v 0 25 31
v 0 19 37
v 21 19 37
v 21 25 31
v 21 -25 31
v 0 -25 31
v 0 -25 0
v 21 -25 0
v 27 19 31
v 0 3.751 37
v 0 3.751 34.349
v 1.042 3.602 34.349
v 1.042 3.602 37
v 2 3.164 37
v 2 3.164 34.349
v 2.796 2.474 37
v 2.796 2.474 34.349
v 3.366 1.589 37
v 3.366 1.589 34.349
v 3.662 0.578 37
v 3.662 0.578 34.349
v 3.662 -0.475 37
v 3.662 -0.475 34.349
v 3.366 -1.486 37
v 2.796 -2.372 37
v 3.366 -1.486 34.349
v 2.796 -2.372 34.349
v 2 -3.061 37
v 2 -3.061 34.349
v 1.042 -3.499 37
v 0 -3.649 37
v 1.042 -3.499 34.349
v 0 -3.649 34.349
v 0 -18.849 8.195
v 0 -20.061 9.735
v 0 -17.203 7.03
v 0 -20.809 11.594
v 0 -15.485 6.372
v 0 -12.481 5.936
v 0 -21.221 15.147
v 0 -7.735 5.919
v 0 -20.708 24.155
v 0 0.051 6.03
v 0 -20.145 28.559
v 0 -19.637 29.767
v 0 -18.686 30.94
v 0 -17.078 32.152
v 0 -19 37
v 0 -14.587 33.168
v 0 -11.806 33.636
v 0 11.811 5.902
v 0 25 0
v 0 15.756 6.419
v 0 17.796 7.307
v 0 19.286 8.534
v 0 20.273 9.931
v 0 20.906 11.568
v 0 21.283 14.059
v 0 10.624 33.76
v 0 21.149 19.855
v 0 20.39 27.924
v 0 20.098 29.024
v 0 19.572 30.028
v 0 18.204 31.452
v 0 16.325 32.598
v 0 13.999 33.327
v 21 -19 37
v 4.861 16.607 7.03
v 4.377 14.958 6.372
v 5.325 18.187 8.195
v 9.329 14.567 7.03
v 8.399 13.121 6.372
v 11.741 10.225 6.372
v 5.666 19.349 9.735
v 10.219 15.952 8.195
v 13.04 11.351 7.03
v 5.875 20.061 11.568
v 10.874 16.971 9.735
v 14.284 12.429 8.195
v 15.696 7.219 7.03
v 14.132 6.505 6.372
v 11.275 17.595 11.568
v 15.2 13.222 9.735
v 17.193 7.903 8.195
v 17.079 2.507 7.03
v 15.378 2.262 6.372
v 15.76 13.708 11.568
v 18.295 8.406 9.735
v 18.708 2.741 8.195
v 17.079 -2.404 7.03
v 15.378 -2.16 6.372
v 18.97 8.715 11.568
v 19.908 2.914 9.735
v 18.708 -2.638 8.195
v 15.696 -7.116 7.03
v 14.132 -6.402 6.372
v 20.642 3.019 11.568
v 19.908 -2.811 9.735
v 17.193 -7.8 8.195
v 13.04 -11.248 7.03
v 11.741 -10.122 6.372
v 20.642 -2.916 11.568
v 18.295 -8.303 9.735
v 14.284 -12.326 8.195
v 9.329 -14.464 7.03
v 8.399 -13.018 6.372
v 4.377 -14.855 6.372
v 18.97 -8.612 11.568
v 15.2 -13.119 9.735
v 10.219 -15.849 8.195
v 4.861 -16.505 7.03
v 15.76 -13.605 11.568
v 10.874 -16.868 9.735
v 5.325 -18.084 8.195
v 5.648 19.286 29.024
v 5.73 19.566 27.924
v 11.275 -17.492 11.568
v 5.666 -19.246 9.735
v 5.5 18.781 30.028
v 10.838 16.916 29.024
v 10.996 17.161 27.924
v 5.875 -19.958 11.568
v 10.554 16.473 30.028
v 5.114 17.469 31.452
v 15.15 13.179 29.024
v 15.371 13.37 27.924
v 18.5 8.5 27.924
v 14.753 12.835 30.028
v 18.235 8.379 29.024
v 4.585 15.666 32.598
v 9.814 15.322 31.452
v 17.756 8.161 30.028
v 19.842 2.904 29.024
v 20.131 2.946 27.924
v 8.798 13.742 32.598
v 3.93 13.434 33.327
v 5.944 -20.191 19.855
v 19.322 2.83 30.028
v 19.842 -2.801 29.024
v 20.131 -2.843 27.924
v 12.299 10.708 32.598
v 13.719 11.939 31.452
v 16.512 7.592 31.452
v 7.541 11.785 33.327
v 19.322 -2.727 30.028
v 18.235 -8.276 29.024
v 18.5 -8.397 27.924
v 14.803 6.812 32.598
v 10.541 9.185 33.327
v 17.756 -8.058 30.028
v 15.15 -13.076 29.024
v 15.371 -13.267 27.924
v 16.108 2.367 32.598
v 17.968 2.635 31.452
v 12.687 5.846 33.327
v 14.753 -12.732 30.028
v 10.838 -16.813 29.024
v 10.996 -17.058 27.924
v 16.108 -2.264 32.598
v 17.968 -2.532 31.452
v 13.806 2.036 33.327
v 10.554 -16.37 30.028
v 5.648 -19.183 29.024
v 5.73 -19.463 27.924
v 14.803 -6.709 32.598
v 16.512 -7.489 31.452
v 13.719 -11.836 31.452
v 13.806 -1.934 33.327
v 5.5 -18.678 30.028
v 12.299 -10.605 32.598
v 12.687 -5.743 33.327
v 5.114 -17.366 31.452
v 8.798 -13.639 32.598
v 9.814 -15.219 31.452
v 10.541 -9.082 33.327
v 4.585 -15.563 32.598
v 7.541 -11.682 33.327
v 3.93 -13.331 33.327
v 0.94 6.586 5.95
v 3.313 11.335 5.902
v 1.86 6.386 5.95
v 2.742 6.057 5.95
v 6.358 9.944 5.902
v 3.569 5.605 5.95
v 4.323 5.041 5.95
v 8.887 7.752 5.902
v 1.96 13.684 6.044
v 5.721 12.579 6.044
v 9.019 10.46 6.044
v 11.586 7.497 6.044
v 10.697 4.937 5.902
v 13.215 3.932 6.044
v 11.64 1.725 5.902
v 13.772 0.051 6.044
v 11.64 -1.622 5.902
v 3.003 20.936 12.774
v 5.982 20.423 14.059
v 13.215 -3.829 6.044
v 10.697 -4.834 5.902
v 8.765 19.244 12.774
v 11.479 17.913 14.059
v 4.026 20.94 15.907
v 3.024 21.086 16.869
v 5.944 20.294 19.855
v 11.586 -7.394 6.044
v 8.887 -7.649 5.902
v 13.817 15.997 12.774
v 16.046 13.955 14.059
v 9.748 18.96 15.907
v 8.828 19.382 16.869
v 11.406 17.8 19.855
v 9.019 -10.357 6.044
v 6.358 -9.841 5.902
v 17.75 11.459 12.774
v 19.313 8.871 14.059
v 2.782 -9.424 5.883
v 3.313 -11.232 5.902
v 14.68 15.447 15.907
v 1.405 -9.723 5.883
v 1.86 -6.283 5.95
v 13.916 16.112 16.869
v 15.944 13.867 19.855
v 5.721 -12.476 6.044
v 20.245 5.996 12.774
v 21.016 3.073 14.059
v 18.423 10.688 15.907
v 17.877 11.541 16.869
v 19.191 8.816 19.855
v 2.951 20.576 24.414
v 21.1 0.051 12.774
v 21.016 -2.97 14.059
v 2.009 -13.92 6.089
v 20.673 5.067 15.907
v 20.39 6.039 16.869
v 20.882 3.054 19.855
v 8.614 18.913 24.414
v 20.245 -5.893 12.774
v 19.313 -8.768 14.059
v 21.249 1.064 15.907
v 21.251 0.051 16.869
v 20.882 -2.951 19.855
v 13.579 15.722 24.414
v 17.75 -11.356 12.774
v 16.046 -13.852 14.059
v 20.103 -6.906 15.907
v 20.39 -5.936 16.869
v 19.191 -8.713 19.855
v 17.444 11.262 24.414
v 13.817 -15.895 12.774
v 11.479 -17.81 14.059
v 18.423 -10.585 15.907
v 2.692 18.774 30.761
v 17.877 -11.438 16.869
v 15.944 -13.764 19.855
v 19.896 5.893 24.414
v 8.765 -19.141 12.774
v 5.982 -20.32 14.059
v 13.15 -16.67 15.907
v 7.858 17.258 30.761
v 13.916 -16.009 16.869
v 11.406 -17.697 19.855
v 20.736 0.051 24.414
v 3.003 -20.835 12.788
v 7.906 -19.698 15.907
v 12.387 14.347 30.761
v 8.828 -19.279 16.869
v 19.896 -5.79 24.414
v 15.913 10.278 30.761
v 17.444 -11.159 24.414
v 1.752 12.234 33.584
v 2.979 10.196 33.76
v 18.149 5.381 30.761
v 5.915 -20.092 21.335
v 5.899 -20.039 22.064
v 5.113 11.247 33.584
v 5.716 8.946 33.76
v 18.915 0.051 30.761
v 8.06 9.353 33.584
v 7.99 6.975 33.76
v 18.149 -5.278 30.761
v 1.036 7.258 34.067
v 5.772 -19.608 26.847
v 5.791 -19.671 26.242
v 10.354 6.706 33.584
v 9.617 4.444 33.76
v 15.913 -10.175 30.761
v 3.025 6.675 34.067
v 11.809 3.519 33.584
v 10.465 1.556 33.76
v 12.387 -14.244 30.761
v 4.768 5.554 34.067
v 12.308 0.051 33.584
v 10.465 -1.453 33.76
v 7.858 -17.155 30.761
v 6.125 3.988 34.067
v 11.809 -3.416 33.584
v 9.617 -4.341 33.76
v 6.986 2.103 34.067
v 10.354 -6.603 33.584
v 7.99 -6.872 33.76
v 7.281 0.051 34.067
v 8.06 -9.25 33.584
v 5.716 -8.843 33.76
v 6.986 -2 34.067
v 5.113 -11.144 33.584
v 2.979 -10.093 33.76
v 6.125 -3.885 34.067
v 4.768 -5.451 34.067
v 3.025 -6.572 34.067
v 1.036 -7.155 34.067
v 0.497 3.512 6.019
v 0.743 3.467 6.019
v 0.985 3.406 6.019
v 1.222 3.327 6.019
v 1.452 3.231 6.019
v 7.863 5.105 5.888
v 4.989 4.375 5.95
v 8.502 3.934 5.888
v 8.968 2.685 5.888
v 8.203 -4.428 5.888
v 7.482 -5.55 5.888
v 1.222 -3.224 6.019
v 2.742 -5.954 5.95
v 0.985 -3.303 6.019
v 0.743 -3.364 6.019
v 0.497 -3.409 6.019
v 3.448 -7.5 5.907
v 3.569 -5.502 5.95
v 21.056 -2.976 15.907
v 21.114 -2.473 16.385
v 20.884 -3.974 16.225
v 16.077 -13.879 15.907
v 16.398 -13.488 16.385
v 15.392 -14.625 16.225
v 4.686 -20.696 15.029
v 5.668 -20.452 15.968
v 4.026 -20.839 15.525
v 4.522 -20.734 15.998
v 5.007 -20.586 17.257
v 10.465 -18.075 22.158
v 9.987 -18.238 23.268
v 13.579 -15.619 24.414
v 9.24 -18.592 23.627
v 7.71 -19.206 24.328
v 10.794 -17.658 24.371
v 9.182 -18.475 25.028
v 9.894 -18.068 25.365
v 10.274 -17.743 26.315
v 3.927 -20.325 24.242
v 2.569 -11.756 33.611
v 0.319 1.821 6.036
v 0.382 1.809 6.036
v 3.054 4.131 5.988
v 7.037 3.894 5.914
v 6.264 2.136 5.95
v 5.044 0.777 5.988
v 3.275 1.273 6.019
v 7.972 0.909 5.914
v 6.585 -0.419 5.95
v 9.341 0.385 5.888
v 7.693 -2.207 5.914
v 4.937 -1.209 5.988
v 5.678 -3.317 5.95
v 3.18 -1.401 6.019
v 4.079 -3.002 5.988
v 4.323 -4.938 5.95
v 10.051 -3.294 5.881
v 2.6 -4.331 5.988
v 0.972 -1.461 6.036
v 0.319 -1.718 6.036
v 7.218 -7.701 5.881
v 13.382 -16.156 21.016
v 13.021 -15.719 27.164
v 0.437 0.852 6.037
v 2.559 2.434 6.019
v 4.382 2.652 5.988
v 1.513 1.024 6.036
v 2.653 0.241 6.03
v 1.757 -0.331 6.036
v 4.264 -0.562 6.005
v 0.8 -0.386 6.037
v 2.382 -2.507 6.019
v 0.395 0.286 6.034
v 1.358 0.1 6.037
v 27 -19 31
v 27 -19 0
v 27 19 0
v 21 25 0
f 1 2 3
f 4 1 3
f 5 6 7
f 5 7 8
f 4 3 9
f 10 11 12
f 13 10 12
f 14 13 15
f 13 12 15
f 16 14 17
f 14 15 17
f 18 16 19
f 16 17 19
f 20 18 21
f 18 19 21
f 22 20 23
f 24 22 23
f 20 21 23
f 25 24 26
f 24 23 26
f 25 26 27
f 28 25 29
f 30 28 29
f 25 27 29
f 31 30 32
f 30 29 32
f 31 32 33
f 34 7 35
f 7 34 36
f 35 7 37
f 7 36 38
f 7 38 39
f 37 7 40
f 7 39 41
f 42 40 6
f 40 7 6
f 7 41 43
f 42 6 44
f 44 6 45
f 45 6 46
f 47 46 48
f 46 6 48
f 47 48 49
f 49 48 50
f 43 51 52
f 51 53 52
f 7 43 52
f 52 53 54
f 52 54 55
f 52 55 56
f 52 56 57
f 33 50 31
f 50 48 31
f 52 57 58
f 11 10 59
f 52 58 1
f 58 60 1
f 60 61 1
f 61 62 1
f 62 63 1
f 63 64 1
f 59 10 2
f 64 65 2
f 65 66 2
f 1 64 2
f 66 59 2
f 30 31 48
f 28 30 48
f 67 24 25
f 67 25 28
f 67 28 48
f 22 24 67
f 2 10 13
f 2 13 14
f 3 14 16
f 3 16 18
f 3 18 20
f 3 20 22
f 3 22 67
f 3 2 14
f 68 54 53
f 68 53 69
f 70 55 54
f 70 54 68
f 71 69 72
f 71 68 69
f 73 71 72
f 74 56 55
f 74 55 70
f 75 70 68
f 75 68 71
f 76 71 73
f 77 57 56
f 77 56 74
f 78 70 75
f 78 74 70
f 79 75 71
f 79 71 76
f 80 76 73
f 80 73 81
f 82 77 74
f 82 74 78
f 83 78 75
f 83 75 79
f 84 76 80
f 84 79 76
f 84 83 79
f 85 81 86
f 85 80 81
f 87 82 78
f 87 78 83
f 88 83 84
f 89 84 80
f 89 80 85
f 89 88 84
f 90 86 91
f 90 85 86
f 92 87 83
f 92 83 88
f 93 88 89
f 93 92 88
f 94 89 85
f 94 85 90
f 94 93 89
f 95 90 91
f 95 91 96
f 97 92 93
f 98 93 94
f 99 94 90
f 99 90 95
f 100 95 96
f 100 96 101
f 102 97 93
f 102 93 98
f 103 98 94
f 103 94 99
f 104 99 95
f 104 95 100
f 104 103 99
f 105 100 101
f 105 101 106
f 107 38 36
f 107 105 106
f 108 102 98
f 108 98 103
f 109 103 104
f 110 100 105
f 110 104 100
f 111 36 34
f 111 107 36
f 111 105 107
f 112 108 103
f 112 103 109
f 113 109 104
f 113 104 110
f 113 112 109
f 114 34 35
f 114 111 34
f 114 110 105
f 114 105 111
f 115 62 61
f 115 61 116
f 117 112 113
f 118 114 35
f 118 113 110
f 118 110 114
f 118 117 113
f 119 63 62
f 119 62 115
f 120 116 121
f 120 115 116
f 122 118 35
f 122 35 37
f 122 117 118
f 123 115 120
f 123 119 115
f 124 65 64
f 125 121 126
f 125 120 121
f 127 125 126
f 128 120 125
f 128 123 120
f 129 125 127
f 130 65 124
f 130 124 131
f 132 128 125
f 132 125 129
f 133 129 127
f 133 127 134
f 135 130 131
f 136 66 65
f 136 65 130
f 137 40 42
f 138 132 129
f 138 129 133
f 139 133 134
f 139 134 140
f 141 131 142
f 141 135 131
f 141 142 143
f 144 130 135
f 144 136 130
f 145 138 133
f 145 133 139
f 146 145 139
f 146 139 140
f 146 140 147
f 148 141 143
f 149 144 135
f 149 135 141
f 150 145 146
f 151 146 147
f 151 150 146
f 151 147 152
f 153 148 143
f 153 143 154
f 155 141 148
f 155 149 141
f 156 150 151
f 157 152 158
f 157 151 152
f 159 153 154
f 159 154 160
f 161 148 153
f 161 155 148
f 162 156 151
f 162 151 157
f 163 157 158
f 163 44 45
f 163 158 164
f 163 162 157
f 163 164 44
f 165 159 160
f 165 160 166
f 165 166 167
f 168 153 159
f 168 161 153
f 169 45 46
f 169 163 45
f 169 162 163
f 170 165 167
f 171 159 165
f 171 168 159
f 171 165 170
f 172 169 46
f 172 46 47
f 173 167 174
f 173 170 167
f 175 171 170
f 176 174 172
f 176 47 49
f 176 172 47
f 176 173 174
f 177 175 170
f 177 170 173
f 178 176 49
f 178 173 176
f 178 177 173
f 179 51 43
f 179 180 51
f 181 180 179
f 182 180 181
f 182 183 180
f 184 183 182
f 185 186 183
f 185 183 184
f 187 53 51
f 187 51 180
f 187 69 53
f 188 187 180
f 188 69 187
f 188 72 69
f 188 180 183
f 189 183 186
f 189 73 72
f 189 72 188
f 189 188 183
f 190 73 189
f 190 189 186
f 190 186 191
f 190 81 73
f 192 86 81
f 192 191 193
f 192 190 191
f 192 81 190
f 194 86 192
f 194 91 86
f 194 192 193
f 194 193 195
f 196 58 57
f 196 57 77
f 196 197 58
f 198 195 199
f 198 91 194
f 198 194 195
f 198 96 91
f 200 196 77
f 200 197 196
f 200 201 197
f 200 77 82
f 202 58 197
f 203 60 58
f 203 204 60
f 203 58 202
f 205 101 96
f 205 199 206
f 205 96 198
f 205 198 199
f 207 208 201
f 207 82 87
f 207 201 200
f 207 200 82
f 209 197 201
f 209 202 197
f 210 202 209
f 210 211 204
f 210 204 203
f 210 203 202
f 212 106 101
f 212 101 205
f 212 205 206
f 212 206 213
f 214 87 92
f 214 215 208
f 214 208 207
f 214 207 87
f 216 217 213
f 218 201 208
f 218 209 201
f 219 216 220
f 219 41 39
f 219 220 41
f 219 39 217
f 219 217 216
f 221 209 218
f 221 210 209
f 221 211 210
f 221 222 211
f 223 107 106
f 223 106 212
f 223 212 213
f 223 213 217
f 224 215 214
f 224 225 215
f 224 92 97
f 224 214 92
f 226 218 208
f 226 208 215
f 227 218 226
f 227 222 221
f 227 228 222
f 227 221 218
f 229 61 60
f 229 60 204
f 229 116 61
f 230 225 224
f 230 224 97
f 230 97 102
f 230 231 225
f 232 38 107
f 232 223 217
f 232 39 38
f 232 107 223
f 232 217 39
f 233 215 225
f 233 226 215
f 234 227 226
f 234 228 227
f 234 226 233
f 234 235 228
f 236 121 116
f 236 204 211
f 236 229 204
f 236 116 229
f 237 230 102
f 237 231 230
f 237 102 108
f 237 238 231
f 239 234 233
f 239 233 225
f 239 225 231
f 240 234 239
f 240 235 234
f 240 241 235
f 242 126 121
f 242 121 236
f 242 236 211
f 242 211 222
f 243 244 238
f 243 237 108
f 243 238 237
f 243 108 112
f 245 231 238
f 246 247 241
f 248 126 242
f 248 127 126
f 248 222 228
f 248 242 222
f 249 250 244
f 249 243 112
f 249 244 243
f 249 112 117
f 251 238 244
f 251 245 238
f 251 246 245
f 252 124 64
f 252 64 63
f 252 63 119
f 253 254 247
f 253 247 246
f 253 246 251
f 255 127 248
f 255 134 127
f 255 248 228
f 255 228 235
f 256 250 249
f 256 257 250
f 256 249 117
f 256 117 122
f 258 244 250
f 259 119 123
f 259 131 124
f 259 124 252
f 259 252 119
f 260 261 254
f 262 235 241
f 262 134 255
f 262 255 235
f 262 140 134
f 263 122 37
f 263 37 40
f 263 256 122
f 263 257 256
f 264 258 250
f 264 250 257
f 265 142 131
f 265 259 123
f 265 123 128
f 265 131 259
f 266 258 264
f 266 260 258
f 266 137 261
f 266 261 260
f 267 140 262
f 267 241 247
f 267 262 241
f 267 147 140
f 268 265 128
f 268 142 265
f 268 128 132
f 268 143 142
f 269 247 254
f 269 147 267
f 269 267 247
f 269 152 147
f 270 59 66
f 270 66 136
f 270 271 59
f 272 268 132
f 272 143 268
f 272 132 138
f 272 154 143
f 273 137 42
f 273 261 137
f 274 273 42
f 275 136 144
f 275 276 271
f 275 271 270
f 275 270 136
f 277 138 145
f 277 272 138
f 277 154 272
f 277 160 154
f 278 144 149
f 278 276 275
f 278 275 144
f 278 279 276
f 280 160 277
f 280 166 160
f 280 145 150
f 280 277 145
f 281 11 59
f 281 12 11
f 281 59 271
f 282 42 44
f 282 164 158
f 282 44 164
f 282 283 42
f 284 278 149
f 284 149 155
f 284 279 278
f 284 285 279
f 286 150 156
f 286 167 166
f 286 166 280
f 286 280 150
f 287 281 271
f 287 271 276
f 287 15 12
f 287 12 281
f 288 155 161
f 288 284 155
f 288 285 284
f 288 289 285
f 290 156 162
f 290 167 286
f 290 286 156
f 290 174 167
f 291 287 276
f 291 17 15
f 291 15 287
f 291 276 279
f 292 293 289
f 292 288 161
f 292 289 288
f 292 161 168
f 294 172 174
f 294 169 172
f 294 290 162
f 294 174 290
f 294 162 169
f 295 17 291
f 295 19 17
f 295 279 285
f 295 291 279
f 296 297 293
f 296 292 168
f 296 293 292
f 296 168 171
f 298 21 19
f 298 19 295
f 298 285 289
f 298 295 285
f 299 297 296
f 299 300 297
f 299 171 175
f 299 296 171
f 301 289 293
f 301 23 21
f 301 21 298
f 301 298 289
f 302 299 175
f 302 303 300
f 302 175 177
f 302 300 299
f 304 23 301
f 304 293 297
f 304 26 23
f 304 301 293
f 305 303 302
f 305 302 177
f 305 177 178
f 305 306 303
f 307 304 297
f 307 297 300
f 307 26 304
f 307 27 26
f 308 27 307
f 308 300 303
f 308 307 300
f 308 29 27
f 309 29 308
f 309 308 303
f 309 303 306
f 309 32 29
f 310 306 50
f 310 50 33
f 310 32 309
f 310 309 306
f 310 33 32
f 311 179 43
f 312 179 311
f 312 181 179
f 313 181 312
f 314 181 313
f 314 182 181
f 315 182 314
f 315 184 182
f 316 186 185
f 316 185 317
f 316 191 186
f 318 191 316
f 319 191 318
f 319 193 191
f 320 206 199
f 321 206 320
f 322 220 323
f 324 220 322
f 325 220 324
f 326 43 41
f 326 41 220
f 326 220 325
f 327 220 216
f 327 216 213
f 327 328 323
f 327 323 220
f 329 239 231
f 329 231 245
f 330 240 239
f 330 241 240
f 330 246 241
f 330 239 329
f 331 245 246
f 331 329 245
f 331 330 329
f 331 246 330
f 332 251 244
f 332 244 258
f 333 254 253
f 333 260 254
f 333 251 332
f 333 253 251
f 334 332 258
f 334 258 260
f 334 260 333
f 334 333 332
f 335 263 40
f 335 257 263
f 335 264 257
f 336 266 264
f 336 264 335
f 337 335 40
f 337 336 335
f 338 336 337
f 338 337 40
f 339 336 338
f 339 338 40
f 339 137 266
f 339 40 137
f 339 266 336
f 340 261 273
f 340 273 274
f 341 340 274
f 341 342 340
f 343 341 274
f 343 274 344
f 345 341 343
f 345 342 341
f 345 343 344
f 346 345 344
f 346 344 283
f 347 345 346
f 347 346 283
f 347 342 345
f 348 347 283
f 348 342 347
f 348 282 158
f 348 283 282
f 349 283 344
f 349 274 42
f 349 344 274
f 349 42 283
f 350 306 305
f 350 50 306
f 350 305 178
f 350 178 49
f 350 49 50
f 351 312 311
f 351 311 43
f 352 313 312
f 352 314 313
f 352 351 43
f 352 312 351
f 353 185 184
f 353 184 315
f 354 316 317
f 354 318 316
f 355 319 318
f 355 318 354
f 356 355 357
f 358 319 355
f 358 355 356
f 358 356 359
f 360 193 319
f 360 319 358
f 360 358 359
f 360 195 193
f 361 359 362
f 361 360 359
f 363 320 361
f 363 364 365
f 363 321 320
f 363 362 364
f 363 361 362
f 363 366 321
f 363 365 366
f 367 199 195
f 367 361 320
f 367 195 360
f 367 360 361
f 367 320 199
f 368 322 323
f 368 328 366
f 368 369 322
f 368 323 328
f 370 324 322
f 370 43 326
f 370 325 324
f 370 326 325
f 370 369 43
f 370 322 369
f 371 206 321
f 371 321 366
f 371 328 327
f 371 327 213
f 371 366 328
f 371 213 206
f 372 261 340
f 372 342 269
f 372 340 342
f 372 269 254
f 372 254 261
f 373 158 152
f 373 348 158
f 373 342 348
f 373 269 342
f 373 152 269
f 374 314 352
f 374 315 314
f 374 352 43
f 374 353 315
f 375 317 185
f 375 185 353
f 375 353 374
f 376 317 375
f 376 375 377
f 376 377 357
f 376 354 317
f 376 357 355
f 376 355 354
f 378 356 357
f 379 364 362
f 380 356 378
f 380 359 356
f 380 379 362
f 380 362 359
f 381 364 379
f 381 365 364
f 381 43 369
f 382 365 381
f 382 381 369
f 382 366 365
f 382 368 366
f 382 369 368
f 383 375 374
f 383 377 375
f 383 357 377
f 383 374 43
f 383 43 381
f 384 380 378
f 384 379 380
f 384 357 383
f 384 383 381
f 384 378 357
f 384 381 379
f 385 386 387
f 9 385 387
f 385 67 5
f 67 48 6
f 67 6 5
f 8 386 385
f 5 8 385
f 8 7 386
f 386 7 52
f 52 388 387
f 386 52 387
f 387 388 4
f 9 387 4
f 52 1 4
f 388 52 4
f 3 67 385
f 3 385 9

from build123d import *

# Parameters (mm, degrees)
F0_W     = 54
F0_H     = 50
F1_DEPTH = 37
F2_SIZE  = 6
F3_W     = 33.1910252571
F3_H     = 75.3957368433
F4_DEPTH = 50


with BuildPart() as f1:
    # F0 (on Top) → F1 (new body)
    with BuildSketch(Plane.XY):
        Rectangle(F0_W, F0_H)
    extrude(amount=F1_DEPTH)

    # F2
    f2_edges = [f1.edges().sort_by_distance(p)[0] for p in [
        (0, -25, 37),
        (27, 0, 37),
        (0, 25, 37),
        (-27, 0, 37),
        (27, -25, 18.5),
        (27, 25, 18.5),
        (-27, -25, 18.5),
        (-27, 25, 18.5),
    ]]
    chamfer(f2_edges, length=F2_SIZE)

    # F3 (on face) → F4 (cut)
    with BuildSketch(Plane.XY.offset(37)):
        with Locations((-16.5955126286, -0.3555361181)):
            Rectangle(F3_W, F3_H)
    extrude(amount=-F4_DEPTH, mode=Mode.SUBTRACT)

    # F5 (on face) → F6 (revolve, cut)
    with BuildSketch(Plane(origin=(0, 0, 0), x_dir=(0, -1, 0), z_dir=(-1, 0, 0))):
        with BuildLine():
            add(Edge.make_bspline(
                [(-0.0514760613, 6.0301115736), (-7.7264895663, 6.1141476035), (-15.6943520391, 4.9548925102), (-21.4225666765, 10.1482430019), (-21.3801191593, 17.9146779993), (-20.6366335968, 26.3222597751), (-20.1427475307, 30.0738309559), (-15.9227977542, 33.3885149829), (-10.3214163539, 33.7379969108), (-5.8658203301, 34.2292072611), (-3.7514760613, 34.3491211657)],
                knots=[0, 0, 0, 0, 0.1841228893, 0.2950075682, 0.4215719078, 0.5555240151, 0.642229878, 0.7414659734, 0.8575719069, 0.9488735314, 0.9488735314, 0.9488735314, 0.9488735314], degree=3))
            Line((-0.0514760613, 6.0301115736), (-0.0514760613, 34.4343753532))
            add(Edge.make_bspline(
                [(-3.7514760613, 34.3491211657), (-2.5674998016, 34.4162697462), (-1.3355556837, 34.4532156266), (-0.0514760613, 34.4343753532)],
                knots=[0.9488735314, 0.9488735314, 0.9488735314, 0.9488735314, 1, 1, 1, 1], degree=3))
        make_face()
        with BuildLine():
            Line((-3.7514760613, 37.2172761336), (-3.7514760613, 34.3491211657))
            add(Edge.make_bspline(
                [(-3.7514760613, 34.3491211657), (-2.5674998016, 34.4162697462), (-1.3355556837, 34.4532156266), (-0.0514760613, 34.4343753532)],
                knots=[0.9488735314, 0.9488735314, 0.9488735314, 0.9488735314, 1, 1, 1, 1], degree=3))
            Line((-0.0514760613, 34.4343753532), (-0.0514760613, 37.2172761336))
            Line((-0.0514760613, 37.2172761336), (-3.7514760613, 37.2172761336))
        make_face()
    revolve(axis=Axis((0, 0.0514760613, 21.6236938536), (0, 0, -1)), mode=Mode.SUBTRACT)


solid = f1.part
